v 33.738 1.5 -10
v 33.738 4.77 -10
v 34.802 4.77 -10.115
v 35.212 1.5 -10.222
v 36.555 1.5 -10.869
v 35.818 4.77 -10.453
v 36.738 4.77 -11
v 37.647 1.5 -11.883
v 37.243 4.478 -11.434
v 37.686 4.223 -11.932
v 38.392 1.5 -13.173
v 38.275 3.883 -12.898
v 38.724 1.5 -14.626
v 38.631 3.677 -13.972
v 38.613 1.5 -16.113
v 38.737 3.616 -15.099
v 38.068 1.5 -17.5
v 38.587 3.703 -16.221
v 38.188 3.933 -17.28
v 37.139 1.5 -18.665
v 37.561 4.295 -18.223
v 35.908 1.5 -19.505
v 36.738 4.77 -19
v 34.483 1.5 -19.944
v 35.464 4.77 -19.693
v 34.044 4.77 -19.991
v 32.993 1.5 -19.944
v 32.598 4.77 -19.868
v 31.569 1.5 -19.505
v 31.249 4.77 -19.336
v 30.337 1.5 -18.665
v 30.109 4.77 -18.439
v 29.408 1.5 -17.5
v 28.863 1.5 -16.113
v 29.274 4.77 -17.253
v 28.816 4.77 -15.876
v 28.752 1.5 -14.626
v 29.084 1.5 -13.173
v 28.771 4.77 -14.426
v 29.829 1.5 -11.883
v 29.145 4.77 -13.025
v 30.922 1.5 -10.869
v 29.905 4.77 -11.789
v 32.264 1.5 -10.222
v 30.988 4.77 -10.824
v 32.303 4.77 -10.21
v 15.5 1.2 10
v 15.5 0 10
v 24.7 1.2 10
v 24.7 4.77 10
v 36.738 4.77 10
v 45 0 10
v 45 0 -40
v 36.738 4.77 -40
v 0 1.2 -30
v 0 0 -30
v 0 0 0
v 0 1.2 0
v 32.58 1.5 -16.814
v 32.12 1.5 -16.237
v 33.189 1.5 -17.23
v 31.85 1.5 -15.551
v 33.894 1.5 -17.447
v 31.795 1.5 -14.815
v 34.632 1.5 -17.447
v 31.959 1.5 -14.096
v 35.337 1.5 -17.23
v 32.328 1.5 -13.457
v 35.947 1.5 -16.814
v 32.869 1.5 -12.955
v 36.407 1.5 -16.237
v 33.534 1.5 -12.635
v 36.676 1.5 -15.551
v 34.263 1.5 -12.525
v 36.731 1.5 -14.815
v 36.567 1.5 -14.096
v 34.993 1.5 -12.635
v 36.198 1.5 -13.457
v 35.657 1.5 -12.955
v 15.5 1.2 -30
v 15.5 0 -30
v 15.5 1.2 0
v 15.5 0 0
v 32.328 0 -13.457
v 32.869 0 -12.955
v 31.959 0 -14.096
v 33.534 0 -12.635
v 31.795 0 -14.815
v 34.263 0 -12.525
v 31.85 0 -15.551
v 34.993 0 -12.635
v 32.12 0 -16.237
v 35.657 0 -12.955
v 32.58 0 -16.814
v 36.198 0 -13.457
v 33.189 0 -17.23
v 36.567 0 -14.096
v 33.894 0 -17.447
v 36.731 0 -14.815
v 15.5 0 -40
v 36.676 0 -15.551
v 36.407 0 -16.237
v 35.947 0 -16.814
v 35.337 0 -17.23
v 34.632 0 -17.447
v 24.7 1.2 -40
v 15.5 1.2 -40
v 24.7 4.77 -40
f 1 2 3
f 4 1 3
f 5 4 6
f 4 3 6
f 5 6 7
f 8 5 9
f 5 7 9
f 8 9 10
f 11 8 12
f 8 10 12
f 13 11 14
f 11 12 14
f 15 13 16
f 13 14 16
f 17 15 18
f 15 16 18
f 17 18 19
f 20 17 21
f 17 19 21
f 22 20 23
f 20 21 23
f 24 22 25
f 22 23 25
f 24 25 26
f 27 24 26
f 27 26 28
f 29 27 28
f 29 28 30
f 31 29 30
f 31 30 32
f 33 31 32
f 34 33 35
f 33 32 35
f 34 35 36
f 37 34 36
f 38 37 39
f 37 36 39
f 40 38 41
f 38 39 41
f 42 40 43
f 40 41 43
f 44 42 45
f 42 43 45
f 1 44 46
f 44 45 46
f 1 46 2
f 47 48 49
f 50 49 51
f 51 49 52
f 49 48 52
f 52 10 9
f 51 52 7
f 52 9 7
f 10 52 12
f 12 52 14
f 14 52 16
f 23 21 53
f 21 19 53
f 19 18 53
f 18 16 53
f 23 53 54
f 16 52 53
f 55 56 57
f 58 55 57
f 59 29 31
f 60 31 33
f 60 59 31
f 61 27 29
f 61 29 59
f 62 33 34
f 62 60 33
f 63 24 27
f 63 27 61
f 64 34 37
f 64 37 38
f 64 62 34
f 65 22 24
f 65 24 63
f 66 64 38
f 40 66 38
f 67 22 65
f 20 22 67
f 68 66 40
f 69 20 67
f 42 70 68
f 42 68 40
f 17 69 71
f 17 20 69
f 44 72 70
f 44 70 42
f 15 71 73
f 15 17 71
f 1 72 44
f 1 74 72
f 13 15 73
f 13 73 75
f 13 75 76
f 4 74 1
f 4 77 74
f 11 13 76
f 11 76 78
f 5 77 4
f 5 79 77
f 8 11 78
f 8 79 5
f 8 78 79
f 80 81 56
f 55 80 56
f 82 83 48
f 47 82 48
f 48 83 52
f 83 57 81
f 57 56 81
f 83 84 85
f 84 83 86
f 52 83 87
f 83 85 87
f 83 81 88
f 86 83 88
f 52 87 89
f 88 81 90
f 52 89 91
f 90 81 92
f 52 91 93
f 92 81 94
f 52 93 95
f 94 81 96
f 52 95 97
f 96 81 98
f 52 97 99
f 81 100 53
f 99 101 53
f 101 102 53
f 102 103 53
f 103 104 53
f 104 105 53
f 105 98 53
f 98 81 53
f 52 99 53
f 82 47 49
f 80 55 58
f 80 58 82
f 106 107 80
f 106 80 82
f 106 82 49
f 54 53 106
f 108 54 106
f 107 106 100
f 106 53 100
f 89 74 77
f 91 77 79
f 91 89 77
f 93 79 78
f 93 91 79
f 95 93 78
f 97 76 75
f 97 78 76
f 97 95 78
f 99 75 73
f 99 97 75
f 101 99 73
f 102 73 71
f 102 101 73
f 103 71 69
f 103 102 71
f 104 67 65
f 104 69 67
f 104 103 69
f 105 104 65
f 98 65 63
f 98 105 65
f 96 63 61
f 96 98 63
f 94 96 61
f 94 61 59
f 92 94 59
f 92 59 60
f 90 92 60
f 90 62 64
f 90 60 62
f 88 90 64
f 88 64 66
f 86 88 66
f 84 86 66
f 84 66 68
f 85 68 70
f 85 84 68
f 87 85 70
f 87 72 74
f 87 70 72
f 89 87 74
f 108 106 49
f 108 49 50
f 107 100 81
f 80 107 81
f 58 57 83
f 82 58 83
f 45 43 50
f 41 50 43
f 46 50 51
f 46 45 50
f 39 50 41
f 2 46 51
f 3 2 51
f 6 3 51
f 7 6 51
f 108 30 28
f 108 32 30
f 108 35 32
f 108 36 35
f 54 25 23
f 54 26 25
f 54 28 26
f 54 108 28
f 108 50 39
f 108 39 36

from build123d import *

# Parameters (mm, degrees)
SALIENTE_EXTRUIR1_DEPTH = 4.77
CORTAR_EXTRUIR1_START   = -40
CROQUIS2_W              = 24.7
CROQUIS2_H              = 3.57
CORTAR_EXTRUIR1_DEPTH   = 50
CORTAR_EXTRUIR2_START   = -50
CORTAR_EXTRUIR2_DEPTH   = 50
CORTAR_EXTRUIR3_START   = -4.77
CROQUIS4_R              = 2.474873734
CORTAR_EXTRUIR3_DEPTH   = 4.77
CROQUIS5_R              = 5
CORTAR_EXTRUIR4_DEPTH   = 3.27


with BuildPart() as part:
    # Croquis1 → Saliente-Extruir1 (new body)
    with BuildSketch(Plane(origin=(0, 0, 0), x_dir=(1, 0, 0), z_dir=(0, 1, 0))):
        Polygon((0, 0), (15.5, 0), (15.5, -10), (45, -10), (45, 40), (15.5, 40), (15.5, 30), (0, 30), align=None)
    extrude(amount=SALIENTE_EXTRUIR1_DEPTH)

    # Croquis2 → Cortar-Extruir1 (cut)
    with BuildSketch(Plane.XY.offset(CORTAR_EXTRUIR1_START)):
        with Locations((12.35, 2.985)):
            Rectangle(CROQUIS2_W, CROQUIS2_H)
    extrude(amount=CORTAR_EXTRUIR1_DEPTH, mode=Mode.SUBTRACT)

    # Croquis3 → Cortar-Extruir2 (cut)
    with BuildSketch(Plane.XY.offset(10).offset(CORTAR_EXTRUIR2_START)):
        Polygon((45, 0), (36.738117648, 4.77), (45, 4.77), align=None)
    extrude(amount=CORTAR_EXTRUIR2_DEPTH, mode=Mode.SUBTRACT)

    # Croquis4 → Cortar-Extruir3 (cut)
    with BuildSketch(Plane(origin=(0, 4.77, 0), x_dir=(1, 0, 0), z_dir=(0, 1, 0)).offset(CORTAR_EXTRUIR3_START)):
        with Locations(Location((34.263243914, 15, 0), (0, 0, 270))):
            Circle(CROQUIS4_R)
    extrude(amount=CORTAR_EXTRUIR3_DEPTH, mode=Mode.SUBTRACT)

    # Croquis5 → Cortar-Extruir4 (cut)
    with BuildSketch(Plane(origin=(0, 4.77, 0), x_dir=(1, 0, 0), z_dir=(0, 1, 0))):
        with Locations(Location((33.738117648, 15, 0), (0, 0, 270))):
            Circle(CROQUIS5_R)
    extrude(amount=-CORTAR_EXTRUIR4_DEPTH, mode=Mode.SUBTRACT)


solid = part.part
